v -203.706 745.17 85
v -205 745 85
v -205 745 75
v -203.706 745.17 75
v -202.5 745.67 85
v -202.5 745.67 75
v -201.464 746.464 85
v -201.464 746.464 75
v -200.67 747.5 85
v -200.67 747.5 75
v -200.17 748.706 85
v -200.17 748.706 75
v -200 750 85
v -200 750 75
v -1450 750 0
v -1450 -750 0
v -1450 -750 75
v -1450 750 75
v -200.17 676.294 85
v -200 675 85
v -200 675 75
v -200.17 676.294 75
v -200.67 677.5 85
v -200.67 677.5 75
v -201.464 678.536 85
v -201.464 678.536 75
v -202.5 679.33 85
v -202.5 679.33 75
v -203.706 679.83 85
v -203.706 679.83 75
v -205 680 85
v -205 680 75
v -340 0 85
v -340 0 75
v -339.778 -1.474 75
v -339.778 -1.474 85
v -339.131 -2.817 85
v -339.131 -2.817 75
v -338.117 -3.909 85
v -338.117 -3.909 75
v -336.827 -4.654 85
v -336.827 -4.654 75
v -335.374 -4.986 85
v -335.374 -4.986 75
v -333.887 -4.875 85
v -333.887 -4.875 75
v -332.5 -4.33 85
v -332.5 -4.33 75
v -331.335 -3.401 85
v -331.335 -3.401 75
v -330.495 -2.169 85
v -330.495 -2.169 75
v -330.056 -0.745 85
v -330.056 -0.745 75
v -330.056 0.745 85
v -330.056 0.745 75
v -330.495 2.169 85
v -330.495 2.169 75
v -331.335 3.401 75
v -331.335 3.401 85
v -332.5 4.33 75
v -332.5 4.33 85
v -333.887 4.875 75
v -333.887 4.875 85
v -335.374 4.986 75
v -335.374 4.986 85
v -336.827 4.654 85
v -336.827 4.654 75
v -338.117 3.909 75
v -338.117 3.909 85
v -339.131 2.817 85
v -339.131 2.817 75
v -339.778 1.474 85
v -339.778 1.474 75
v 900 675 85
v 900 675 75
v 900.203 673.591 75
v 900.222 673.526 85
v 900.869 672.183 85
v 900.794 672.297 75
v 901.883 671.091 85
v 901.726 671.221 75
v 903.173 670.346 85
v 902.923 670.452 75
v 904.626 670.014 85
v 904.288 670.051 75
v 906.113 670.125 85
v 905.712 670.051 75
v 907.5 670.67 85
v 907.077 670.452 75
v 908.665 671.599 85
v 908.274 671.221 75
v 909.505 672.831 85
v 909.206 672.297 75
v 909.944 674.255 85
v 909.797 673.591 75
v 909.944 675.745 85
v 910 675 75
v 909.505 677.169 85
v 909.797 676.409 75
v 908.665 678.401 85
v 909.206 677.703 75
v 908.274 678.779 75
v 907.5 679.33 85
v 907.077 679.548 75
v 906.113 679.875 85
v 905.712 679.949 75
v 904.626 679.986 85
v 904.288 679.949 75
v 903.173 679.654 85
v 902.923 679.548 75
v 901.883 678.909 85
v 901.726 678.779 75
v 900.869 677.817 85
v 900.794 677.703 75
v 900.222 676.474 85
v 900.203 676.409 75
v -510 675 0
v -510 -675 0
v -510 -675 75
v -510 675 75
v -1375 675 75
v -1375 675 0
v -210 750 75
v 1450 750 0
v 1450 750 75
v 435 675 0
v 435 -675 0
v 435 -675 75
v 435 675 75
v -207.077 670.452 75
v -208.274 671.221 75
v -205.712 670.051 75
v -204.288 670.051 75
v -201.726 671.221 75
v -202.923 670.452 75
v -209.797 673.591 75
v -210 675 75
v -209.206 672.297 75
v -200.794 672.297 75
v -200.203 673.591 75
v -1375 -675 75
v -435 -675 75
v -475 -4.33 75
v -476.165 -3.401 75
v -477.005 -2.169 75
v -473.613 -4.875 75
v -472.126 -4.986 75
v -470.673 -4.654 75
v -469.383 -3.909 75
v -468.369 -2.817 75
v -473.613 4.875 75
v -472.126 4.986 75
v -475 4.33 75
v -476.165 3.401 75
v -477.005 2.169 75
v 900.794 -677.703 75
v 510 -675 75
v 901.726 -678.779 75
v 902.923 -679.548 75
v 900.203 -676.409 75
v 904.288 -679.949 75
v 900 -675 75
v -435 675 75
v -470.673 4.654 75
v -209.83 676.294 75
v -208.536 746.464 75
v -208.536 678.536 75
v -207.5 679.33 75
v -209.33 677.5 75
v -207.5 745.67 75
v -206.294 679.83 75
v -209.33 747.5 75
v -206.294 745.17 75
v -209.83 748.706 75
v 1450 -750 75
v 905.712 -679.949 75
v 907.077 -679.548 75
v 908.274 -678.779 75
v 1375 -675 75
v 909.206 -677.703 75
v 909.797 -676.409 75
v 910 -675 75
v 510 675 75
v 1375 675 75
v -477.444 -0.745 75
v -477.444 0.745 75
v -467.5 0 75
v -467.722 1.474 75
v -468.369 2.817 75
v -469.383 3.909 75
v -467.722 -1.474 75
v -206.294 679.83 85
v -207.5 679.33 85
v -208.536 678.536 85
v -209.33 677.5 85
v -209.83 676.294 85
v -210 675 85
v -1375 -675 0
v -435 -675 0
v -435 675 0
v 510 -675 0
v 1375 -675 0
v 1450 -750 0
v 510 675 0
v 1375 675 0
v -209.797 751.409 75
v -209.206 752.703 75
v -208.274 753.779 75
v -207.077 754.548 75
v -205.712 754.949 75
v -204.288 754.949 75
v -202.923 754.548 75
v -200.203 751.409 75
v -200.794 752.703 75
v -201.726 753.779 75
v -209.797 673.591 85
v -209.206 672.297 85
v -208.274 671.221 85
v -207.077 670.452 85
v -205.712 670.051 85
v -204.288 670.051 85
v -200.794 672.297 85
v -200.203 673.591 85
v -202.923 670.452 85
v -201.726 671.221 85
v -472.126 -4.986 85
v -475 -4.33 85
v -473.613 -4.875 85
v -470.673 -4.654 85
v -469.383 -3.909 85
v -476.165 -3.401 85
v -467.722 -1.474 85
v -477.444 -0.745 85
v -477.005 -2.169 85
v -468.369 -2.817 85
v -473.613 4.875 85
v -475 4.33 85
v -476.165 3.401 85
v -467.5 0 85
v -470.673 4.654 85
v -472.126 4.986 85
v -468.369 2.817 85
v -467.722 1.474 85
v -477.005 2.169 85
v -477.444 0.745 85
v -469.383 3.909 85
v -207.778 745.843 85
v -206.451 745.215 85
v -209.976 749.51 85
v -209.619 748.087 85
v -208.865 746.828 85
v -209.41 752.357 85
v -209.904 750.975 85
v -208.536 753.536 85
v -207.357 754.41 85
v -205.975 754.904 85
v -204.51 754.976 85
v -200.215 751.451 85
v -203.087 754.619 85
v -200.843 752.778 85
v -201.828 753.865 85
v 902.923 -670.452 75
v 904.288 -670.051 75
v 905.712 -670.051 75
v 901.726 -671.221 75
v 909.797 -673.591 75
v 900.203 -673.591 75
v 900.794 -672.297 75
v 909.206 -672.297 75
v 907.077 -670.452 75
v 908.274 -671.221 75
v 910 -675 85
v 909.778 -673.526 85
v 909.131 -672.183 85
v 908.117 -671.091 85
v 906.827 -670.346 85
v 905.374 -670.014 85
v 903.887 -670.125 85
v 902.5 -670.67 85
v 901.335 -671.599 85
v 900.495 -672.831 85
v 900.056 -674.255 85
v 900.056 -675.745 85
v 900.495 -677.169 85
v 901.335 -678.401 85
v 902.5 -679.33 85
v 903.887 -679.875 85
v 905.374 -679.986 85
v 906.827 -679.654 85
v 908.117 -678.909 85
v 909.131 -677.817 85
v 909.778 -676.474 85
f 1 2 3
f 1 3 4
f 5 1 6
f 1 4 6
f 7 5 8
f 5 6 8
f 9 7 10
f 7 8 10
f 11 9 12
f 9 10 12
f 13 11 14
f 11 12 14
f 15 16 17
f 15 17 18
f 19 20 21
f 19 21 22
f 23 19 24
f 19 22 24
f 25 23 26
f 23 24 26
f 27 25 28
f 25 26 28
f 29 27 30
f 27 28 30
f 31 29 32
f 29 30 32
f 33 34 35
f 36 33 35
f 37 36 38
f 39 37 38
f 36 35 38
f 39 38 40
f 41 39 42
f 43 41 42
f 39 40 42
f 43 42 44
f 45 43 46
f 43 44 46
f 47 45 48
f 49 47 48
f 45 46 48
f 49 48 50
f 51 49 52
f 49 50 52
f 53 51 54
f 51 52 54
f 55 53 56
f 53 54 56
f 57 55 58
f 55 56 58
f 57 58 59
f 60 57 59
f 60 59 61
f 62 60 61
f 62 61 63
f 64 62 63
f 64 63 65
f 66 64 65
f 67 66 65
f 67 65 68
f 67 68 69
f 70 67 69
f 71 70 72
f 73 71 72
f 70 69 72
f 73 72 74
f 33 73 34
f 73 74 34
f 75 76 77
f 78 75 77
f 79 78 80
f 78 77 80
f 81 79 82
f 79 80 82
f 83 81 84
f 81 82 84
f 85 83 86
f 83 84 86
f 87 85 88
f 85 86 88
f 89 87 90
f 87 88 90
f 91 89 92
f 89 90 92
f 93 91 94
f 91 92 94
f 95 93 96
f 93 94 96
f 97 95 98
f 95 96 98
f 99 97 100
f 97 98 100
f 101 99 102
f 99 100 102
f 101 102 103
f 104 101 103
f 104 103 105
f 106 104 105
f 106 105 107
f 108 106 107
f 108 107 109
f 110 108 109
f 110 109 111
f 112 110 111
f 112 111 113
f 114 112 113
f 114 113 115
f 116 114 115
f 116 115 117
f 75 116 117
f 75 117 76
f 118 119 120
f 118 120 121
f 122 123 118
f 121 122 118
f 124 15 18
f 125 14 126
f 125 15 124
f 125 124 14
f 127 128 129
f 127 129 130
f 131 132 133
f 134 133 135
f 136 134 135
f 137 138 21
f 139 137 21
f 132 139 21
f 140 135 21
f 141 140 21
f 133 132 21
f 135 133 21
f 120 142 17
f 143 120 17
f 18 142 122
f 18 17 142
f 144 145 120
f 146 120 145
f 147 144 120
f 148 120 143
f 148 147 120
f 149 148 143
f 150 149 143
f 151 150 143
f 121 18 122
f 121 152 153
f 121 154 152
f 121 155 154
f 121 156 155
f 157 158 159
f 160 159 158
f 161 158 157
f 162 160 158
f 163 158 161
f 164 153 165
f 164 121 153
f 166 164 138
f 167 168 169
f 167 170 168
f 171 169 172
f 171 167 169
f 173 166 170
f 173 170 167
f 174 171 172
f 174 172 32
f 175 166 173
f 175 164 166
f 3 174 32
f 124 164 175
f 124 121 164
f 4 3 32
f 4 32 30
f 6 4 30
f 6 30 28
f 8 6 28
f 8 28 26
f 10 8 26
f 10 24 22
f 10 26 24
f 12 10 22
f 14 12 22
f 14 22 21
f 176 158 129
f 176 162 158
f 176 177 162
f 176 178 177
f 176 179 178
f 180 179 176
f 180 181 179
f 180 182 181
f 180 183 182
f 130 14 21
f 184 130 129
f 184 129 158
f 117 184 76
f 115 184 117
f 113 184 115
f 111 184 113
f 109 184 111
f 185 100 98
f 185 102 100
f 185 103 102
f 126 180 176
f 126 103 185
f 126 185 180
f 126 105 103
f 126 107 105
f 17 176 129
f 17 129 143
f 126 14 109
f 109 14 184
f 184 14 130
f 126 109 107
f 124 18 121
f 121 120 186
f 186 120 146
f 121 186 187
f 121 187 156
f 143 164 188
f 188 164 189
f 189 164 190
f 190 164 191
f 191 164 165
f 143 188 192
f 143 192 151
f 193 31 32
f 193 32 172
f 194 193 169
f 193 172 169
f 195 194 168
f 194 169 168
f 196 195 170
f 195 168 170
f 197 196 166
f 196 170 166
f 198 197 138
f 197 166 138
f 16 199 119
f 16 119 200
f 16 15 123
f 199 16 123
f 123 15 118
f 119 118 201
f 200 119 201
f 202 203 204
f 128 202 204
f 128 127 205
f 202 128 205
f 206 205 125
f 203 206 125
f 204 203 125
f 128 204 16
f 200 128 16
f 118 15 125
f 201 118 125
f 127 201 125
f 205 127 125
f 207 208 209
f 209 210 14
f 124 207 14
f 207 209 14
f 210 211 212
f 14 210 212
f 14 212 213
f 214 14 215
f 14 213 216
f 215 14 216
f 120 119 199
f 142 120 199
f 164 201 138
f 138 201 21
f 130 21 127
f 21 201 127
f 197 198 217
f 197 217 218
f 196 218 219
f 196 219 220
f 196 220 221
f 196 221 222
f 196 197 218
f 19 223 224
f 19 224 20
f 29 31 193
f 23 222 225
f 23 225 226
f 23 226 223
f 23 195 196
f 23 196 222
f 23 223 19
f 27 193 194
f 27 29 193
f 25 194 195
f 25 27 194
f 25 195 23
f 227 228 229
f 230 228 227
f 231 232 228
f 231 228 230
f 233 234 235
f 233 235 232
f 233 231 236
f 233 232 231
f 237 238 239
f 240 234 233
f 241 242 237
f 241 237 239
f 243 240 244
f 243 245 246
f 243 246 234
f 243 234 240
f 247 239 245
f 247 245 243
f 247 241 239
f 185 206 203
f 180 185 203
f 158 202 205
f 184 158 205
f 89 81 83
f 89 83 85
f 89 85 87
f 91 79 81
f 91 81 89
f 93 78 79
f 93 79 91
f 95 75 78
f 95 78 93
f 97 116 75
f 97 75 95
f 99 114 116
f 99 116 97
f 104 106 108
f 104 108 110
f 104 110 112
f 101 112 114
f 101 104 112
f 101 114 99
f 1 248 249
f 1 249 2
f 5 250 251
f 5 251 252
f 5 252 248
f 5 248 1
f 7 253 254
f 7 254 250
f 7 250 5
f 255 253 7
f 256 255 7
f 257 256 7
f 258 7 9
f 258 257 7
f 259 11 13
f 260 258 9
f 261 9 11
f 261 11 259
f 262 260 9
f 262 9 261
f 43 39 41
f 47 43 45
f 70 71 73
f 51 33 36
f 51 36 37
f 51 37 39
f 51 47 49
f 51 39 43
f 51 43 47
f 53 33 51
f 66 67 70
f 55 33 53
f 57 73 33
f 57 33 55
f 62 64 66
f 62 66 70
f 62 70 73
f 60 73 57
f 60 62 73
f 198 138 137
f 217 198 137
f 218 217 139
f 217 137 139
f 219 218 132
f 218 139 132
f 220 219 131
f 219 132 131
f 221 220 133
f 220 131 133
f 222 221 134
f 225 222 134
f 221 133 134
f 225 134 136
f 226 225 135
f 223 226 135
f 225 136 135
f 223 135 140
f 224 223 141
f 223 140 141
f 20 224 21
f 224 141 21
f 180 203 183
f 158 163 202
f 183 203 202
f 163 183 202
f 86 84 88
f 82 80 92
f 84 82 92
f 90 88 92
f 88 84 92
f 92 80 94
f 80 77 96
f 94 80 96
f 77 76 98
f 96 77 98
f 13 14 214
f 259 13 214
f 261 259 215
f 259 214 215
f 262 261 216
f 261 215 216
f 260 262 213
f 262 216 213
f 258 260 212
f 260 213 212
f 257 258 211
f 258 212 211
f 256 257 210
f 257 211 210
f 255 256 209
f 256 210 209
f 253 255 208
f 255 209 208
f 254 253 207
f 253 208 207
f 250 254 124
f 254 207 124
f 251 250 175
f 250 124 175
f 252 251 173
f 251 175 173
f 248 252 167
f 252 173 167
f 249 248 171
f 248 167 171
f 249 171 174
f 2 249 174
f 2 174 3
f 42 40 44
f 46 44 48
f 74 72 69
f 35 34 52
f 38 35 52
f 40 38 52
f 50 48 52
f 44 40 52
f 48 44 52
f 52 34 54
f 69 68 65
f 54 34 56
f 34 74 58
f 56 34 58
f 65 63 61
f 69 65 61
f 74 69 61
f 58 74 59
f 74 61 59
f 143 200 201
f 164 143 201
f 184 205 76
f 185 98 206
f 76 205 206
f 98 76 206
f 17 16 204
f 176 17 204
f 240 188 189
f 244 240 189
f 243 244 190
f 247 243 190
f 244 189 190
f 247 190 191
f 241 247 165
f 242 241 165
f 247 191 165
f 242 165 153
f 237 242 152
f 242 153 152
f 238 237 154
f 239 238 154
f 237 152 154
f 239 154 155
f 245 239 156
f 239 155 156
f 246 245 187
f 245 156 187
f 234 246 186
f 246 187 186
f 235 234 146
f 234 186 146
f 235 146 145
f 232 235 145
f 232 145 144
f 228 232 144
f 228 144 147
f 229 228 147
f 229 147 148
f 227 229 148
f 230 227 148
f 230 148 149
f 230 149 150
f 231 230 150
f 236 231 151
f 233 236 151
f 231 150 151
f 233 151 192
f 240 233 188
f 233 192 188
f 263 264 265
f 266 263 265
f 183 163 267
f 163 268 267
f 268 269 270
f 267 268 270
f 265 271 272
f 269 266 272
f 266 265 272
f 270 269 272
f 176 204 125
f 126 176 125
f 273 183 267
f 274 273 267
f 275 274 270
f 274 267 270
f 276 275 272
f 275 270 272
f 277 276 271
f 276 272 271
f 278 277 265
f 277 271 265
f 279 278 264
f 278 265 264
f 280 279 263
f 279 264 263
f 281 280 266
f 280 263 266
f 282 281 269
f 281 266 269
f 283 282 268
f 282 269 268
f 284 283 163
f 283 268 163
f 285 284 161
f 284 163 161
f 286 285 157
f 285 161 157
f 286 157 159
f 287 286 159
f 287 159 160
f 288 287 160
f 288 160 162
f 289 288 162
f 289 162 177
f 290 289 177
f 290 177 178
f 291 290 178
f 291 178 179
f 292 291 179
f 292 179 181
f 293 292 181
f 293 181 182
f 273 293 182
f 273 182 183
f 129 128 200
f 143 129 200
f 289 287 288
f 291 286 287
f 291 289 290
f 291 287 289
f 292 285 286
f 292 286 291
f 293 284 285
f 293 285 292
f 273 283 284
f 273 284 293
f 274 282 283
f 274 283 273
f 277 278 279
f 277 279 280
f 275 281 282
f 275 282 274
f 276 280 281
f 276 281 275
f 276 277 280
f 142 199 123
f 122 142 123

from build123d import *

# Parameters (mm, degrees)
F0_W     = 2900
F0_H     = 1500
F0_W_2   = 75
F0_H_2   = 1350
F1_DEPTH = 75
F3_DEPTH = 10
F2_R     = 5
F4_DEPTH = 10


with BuildPart() as f1:
    # F0 (on Top) → F1 (new body)
    with BuildSketch(Plane.XY):
        Rectangle(F0_W, F0_H)
        Polygon((-510, -675), (-1375, -675), (-1375, 675), (-510, 675), (-435, 675), (435, 675), (510, 675), (1375, 675), (1375, -675), (510, -675), (435, -675), (-435, -675), align=None, mode=Mode.SUBTRACT)
        with Locations((-472.5, 0)):
            Rectangle(F0_W_2, F0_H_2)
        with Locations((472.5, 0)):
            Rectangle(F0_W_2, F0_H_2)
    extrude(amount=F1_DEPTH)

    # F2 (on face) → F3, piece 2 (join)
    with BuildSketch(Plane.XY.offset(75)):
        with Locations((-472.5, 0)):
            Circle(F2_R)
        with BuildLine():
            Line((-205, 680), (-205, 675))
            Line((-205, 675), (-200, 675))
            ThreePointArc((-200, 675), (-201.4644660941, 678.5355339059), (-205, 680))
        make_face()
        with BuildLine():
            Line((-200, 675), (-205, 675))
            Line((-205, 675), (-210, 675))
            ThreePointArc((-210, 675), (-205, 670), (-200, 675))
        make_face()
        with BuildLine():
            Line((-210, 675), (-205, 675))
            Line((-205, 675), (-205, 680))
            ThreePointArc((-205, 680), (-208.5355339059, 678.5355339059), (-210, 675))
        make_face()
        with BuildLine():
            ThreePointArc((910, 675), (905, 680), (900, 675))
            ThreePointArc((900, 675), (905, 670), (910, 675))
        make_face()
        with BuildLine():
            ThreePointArc((-200, 750), (-208.5355339059, 753.5355339059), (-205, 745))
            ThreePointArc((-205, 745), (-201.4644660941, 746.4644660941), (-200, 750))
        make_face()
        with BuildLine():
            ThreePointArc((900, -675), (905, -680), (910, -675))
            ThreePointArc((910, -675), (905, -670), (900, -675))
        make_face()
    extrude(amount=F3_DEPTH)

    # F2 (on face) → F4, piece 2 (join)
    with BuildSketch(Plane.XY.offset(75)):
        with Locations((-472.5, 0)):
            Circle(F2_R)
        with BuildLine():
            Line((-205, 680), (-205, 675))
            Line((-205, 675), (-200, 675))
            ThreePointArc((-200, 675), (-201.4644660941, 678.5355339059), (-205, 680))
        make_face()
        with BuildLine():
            Line((-200, 675), (-205, 675))
            Line((-205, 675), (-210, 675))
            ThreePointArc((-210, 675), (-205, 670), (-200, 675))
        make_face()
        with BuildLine():
            Line((-210, 675), (-205, 675))
            Line((-205, 675), (-205, 680))
            ThreePointArc((-205, 680), (-208.5355339059, 678.5355339059), (-210, 675))
        make_face()
        with BuildLine():
            ThreePointArc((910, 675), (905, 680), (900, 675))
            ThreePointArc((900, 675), (905, 670), (910, 675))
        make_face()
        with BuildLine():
            ThreePointArc((-200, 750), (-208.5355339059, 753.5355339059), (-205, 745))
            ThreePointArc((-205, 745), (-201.4644660941, 746.4644660941), (-200, 750))
        make_face()
        with BuildLine():
            ThreePointArc((900, -675), (905, -680), (910, -675))
            ThreePointArc((910, -675), (905, -670), (900, -675))
        make_face()
    extrude(amount=F4_DEPTH)


with BuildPart() as f3:
    # F2 (on face) → F3 (new body)
    with BuildSketch(Plane.XY.offset(75)):
        with BuildLine():
            ThreePointArc((-330, 0), (-335, 5), (-340, 0))
            ThreePointArc((-340, 0), (-335, -5), (-330, 0))
        make_face()
    extrude(amount=F3_DEPTH)

    # F2 (on face) → F4 (join)
    with BuildSketch(Plane.XY.offset(75)):
        with BuildLine():
            ThreePointArc((-330, 0), (-335, 5), (-340, 0))
            ThreePointArc((-340, 0), (-335, -5), (-330, 0))
        make_face()
    extrude(amount=F4_DEPTH)


solid = Compound([f1.part, f3.part])
